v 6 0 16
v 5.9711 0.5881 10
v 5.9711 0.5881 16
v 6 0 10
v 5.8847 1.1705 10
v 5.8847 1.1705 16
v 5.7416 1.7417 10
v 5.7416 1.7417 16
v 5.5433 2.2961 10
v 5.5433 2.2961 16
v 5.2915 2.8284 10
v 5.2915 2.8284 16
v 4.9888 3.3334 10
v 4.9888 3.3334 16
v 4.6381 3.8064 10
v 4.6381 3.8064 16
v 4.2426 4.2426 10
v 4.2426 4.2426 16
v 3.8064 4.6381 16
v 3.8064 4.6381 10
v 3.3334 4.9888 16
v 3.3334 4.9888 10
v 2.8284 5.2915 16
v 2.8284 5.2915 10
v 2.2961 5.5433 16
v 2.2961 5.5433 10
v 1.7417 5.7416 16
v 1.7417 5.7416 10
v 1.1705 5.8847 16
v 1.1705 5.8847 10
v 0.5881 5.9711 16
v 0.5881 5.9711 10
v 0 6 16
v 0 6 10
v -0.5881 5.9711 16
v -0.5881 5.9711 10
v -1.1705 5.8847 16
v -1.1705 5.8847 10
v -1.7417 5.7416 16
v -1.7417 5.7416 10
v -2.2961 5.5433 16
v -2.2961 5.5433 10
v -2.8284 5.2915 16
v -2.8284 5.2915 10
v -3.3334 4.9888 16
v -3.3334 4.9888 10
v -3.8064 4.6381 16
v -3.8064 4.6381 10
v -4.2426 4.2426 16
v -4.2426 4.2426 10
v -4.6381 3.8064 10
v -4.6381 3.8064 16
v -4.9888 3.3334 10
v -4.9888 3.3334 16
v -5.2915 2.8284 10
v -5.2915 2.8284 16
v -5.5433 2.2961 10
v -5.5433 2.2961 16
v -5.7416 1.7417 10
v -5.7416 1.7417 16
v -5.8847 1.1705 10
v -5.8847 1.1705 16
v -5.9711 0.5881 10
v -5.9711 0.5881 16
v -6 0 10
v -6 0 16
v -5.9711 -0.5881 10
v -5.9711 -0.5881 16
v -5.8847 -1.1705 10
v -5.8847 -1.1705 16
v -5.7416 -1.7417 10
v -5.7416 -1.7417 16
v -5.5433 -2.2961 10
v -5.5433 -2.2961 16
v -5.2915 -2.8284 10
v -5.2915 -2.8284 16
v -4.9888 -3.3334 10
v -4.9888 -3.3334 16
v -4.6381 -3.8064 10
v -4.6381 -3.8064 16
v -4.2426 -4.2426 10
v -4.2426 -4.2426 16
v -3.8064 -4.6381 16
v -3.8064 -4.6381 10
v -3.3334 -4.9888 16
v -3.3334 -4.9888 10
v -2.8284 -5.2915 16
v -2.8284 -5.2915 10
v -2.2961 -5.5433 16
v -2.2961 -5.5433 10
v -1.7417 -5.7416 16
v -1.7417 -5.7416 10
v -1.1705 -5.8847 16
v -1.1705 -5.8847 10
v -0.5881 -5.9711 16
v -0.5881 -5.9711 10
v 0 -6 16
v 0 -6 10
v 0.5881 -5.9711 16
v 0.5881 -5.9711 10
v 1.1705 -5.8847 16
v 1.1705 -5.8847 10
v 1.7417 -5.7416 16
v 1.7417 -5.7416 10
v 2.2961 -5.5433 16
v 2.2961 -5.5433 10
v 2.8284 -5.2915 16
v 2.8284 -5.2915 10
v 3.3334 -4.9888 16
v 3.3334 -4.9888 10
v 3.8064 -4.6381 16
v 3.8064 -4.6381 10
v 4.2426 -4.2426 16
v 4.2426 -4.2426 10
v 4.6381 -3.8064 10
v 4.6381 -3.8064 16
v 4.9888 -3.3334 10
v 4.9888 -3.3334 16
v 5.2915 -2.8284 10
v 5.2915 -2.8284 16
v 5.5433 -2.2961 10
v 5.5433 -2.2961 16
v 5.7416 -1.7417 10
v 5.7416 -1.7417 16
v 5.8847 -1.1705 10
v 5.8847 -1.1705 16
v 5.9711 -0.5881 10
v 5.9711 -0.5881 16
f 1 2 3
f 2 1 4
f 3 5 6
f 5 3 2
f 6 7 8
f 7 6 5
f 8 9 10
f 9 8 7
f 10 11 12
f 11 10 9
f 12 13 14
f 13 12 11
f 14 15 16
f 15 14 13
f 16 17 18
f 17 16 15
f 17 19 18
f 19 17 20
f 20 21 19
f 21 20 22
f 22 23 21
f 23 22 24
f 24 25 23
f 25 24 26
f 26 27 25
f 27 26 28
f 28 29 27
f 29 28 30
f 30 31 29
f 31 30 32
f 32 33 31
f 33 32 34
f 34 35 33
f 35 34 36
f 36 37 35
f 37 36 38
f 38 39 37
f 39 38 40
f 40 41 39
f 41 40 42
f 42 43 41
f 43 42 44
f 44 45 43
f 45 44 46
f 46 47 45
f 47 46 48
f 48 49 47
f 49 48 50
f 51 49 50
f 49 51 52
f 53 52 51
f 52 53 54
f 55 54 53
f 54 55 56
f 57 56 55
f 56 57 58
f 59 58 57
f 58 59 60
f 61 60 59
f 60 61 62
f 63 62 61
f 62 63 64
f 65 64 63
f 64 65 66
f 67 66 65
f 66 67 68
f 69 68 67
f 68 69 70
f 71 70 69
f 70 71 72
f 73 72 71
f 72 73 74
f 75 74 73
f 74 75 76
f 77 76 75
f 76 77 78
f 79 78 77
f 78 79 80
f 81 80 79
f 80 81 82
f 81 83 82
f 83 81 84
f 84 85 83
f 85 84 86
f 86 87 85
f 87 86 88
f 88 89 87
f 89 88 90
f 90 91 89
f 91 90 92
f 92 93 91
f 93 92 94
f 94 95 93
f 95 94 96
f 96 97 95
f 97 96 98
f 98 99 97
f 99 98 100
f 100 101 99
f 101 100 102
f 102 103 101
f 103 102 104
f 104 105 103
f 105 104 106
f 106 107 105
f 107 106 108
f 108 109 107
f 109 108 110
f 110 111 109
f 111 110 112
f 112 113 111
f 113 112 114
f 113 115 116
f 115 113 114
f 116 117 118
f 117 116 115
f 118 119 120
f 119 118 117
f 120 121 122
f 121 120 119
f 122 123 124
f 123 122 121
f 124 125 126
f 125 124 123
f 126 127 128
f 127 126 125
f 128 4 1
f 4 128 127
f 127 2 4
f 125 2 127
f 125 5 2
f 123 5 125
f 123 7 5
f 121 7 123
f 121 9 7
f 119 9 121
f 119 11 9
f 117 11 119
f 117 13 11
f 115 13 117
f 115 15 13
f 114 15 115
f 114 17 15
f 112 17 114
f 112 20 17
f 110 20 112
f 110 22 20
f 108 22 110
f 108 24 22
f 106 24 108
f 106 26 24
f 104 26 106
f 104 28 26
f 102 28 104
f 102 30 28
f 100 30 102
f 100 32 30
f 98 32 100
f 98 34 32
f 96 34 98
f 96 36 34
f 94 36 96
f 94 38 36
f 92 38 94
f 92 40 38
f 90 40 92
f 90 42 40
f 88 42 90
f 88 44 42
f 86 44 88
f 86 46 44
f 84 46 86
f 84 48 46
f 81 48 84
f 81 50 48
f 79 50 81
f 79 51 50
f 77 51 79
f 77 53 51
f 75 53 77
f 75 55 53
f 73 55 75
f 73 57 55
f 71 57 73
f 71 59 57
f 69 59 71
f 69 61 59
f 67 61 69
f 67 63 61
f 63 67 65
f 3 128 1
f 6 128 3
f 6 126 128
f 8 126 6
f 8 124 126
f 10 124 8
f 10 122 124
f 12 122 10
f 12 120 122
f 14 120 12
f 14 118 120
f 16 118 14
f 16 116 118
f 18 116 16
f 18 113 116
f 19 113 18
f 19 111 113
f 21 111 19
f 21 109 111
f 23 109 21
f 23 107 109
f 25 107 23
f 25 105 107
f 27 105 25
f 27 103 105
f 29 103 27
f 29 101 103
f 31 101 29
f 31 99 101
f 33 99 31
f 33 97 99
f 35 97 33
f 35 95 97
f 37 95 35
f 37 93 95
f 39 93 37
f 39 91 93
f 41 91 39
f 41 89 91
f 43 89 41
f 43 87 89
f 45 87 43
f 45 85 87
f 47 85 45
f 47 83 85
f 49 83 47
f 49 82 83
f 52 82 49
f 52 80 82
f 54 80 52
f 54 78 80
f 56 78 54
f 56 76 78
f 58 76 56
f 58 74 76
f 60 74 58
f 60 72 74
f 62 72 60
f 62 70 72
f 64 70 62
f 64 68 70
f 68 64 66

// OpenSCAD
// Dimensions in mm
inner_diameter_8mm = 8;
outer_diameter_8mm_start = 7.5;
outer_diameter_8mm_end = 9.5;
barb_height_8mm = 10;
total_length_barbs_8mm = 20;

inner_diameter_5mm = 5;
outer_diameter_5mm_start = 6.5;
outer_diameter_5mm_end = 5.0;
barb_height_5mm = 8;
total_length_barbs_5mm = 16;

collar_diameter = 12;

// Print orientation
translate([0, 0, -10]) {
    // Reducer body
    translate([0, 0, 0])
        linear_extrude(41)
            union() {
                // Inner hole
                cylinder(h=41, d=inner_diameter_8mm, $fn=64);
                
                // Outer wall
                circle(d=outer_diameter_8mm_start, h=barb_height_8mm, $fn=64);
                translate([0, 0, barb_height_8mm])
                    circle(d=outer_diameter_8mm_end, h=barb_height_8mm, $fn=64);
                translate([0, 0, 2*barb_height_8mm])
                    circle(d=outer_diameter_8mm_start, h=barb_height_8mm, $fn=64);
                
                // Sawtooth profile
                for (x = [0, outer_diameter_8mm_end - outer_diameter_8mm_start]) {
                    translate([x, 0])
                        circle(d=x, h=barb_height_8mm/2, $fn=64); // Changed to half height
                }
            }
            
    // Barbs for 8 mm tubing
    for (z = [0, total_length_barbs_8mm]) {
        if (z == 0) {
            translate([0, 0, z])
                rotate_extrude([90, 0, 0], angle=180)
                    polygon(points=[[0, 0], [outer_diameter_8mm_start, 0], [outer_diameter_8mm_end, barb_height_8mm/2], [0, barb_height_8mm/2]]);
        } else {
            translate([0, 0, z])
                rotate_extrude([90, 0, 0], angle=180)
                    polygon(points=[[0, 0], [outer_diameter_8mm_start + (z - total_length_barbs_8mm) * (outer_diameter_8mm_end - outer_diameter_8mm_start)/(barb_height_8mm/2), 0], [outer_diameter_8mm_end, barb_height_8mm/2], [0, barb_height_8mm/2]]);
        }
    }
    
    // Collar
    translate([0, 0, total_length_barbs_8mm])
        cylinder(h=collar_diameter/2, d=collar_diameter, $fn=64);
}

// Barbs for 5 mm tubing
for (z = [20, total_length_barbs_5mm + 25]) {
    if (z == 20) {
        translate([0, 0, z])
            rotate_extrude([90, 0, 0], angle=180)
                polygon(points=[[0, 0], [outer_diameter_5mm_start, 0], [outer_diameter_5mm_end, barb_height_5mm/2], [0, barb_height_5mm/2]]);
    } else {
        translate([0, 0, z])
            rotate_extrude([90, 0, 0], angle=180)
                polygon(points=[[0, 0], [outer_diameter_5mm_start + (z - total_length_barbs_5mm) * (outer_diameter_5mm_end - outer_diameter_5mm_start)/(barb_height_5mm/2), 0], [outer_diameter_5mm_end, barb_height_5mm/2], [0, barb_height_5mm/2]]);
    }
}

// Barbs for 5 mm tubing (second set)
for (z = [25, total_length_barbs_5mm]) {
    if (z == 25) {
        translate([0, 0, z])
            rotate_extrude([90, 0, 0], angle=180)
                polygon(points=[[0, 0], [outer_diameter_5mm_start, 0], [outer_diameter_5mm_end, barb_height_5mm/2], [0, barb_height_5mm/2]]);
    } else {
        translate([0, 0, z])
            rotate_extrude([90, 0, 0], angle=180)
                polygon(points=[[0, 0], [outer_diameter_5mm_start + (z - total_length_barbs_5mm) * (outer_diameter_5mm_end - outer_diameter_5mm_start)/(barb_height_5mm/2), 0], [outer_diameter_5mm_end, barb_height_5mm/2], [0, barb_height_5mm/2]]);
    }
}
